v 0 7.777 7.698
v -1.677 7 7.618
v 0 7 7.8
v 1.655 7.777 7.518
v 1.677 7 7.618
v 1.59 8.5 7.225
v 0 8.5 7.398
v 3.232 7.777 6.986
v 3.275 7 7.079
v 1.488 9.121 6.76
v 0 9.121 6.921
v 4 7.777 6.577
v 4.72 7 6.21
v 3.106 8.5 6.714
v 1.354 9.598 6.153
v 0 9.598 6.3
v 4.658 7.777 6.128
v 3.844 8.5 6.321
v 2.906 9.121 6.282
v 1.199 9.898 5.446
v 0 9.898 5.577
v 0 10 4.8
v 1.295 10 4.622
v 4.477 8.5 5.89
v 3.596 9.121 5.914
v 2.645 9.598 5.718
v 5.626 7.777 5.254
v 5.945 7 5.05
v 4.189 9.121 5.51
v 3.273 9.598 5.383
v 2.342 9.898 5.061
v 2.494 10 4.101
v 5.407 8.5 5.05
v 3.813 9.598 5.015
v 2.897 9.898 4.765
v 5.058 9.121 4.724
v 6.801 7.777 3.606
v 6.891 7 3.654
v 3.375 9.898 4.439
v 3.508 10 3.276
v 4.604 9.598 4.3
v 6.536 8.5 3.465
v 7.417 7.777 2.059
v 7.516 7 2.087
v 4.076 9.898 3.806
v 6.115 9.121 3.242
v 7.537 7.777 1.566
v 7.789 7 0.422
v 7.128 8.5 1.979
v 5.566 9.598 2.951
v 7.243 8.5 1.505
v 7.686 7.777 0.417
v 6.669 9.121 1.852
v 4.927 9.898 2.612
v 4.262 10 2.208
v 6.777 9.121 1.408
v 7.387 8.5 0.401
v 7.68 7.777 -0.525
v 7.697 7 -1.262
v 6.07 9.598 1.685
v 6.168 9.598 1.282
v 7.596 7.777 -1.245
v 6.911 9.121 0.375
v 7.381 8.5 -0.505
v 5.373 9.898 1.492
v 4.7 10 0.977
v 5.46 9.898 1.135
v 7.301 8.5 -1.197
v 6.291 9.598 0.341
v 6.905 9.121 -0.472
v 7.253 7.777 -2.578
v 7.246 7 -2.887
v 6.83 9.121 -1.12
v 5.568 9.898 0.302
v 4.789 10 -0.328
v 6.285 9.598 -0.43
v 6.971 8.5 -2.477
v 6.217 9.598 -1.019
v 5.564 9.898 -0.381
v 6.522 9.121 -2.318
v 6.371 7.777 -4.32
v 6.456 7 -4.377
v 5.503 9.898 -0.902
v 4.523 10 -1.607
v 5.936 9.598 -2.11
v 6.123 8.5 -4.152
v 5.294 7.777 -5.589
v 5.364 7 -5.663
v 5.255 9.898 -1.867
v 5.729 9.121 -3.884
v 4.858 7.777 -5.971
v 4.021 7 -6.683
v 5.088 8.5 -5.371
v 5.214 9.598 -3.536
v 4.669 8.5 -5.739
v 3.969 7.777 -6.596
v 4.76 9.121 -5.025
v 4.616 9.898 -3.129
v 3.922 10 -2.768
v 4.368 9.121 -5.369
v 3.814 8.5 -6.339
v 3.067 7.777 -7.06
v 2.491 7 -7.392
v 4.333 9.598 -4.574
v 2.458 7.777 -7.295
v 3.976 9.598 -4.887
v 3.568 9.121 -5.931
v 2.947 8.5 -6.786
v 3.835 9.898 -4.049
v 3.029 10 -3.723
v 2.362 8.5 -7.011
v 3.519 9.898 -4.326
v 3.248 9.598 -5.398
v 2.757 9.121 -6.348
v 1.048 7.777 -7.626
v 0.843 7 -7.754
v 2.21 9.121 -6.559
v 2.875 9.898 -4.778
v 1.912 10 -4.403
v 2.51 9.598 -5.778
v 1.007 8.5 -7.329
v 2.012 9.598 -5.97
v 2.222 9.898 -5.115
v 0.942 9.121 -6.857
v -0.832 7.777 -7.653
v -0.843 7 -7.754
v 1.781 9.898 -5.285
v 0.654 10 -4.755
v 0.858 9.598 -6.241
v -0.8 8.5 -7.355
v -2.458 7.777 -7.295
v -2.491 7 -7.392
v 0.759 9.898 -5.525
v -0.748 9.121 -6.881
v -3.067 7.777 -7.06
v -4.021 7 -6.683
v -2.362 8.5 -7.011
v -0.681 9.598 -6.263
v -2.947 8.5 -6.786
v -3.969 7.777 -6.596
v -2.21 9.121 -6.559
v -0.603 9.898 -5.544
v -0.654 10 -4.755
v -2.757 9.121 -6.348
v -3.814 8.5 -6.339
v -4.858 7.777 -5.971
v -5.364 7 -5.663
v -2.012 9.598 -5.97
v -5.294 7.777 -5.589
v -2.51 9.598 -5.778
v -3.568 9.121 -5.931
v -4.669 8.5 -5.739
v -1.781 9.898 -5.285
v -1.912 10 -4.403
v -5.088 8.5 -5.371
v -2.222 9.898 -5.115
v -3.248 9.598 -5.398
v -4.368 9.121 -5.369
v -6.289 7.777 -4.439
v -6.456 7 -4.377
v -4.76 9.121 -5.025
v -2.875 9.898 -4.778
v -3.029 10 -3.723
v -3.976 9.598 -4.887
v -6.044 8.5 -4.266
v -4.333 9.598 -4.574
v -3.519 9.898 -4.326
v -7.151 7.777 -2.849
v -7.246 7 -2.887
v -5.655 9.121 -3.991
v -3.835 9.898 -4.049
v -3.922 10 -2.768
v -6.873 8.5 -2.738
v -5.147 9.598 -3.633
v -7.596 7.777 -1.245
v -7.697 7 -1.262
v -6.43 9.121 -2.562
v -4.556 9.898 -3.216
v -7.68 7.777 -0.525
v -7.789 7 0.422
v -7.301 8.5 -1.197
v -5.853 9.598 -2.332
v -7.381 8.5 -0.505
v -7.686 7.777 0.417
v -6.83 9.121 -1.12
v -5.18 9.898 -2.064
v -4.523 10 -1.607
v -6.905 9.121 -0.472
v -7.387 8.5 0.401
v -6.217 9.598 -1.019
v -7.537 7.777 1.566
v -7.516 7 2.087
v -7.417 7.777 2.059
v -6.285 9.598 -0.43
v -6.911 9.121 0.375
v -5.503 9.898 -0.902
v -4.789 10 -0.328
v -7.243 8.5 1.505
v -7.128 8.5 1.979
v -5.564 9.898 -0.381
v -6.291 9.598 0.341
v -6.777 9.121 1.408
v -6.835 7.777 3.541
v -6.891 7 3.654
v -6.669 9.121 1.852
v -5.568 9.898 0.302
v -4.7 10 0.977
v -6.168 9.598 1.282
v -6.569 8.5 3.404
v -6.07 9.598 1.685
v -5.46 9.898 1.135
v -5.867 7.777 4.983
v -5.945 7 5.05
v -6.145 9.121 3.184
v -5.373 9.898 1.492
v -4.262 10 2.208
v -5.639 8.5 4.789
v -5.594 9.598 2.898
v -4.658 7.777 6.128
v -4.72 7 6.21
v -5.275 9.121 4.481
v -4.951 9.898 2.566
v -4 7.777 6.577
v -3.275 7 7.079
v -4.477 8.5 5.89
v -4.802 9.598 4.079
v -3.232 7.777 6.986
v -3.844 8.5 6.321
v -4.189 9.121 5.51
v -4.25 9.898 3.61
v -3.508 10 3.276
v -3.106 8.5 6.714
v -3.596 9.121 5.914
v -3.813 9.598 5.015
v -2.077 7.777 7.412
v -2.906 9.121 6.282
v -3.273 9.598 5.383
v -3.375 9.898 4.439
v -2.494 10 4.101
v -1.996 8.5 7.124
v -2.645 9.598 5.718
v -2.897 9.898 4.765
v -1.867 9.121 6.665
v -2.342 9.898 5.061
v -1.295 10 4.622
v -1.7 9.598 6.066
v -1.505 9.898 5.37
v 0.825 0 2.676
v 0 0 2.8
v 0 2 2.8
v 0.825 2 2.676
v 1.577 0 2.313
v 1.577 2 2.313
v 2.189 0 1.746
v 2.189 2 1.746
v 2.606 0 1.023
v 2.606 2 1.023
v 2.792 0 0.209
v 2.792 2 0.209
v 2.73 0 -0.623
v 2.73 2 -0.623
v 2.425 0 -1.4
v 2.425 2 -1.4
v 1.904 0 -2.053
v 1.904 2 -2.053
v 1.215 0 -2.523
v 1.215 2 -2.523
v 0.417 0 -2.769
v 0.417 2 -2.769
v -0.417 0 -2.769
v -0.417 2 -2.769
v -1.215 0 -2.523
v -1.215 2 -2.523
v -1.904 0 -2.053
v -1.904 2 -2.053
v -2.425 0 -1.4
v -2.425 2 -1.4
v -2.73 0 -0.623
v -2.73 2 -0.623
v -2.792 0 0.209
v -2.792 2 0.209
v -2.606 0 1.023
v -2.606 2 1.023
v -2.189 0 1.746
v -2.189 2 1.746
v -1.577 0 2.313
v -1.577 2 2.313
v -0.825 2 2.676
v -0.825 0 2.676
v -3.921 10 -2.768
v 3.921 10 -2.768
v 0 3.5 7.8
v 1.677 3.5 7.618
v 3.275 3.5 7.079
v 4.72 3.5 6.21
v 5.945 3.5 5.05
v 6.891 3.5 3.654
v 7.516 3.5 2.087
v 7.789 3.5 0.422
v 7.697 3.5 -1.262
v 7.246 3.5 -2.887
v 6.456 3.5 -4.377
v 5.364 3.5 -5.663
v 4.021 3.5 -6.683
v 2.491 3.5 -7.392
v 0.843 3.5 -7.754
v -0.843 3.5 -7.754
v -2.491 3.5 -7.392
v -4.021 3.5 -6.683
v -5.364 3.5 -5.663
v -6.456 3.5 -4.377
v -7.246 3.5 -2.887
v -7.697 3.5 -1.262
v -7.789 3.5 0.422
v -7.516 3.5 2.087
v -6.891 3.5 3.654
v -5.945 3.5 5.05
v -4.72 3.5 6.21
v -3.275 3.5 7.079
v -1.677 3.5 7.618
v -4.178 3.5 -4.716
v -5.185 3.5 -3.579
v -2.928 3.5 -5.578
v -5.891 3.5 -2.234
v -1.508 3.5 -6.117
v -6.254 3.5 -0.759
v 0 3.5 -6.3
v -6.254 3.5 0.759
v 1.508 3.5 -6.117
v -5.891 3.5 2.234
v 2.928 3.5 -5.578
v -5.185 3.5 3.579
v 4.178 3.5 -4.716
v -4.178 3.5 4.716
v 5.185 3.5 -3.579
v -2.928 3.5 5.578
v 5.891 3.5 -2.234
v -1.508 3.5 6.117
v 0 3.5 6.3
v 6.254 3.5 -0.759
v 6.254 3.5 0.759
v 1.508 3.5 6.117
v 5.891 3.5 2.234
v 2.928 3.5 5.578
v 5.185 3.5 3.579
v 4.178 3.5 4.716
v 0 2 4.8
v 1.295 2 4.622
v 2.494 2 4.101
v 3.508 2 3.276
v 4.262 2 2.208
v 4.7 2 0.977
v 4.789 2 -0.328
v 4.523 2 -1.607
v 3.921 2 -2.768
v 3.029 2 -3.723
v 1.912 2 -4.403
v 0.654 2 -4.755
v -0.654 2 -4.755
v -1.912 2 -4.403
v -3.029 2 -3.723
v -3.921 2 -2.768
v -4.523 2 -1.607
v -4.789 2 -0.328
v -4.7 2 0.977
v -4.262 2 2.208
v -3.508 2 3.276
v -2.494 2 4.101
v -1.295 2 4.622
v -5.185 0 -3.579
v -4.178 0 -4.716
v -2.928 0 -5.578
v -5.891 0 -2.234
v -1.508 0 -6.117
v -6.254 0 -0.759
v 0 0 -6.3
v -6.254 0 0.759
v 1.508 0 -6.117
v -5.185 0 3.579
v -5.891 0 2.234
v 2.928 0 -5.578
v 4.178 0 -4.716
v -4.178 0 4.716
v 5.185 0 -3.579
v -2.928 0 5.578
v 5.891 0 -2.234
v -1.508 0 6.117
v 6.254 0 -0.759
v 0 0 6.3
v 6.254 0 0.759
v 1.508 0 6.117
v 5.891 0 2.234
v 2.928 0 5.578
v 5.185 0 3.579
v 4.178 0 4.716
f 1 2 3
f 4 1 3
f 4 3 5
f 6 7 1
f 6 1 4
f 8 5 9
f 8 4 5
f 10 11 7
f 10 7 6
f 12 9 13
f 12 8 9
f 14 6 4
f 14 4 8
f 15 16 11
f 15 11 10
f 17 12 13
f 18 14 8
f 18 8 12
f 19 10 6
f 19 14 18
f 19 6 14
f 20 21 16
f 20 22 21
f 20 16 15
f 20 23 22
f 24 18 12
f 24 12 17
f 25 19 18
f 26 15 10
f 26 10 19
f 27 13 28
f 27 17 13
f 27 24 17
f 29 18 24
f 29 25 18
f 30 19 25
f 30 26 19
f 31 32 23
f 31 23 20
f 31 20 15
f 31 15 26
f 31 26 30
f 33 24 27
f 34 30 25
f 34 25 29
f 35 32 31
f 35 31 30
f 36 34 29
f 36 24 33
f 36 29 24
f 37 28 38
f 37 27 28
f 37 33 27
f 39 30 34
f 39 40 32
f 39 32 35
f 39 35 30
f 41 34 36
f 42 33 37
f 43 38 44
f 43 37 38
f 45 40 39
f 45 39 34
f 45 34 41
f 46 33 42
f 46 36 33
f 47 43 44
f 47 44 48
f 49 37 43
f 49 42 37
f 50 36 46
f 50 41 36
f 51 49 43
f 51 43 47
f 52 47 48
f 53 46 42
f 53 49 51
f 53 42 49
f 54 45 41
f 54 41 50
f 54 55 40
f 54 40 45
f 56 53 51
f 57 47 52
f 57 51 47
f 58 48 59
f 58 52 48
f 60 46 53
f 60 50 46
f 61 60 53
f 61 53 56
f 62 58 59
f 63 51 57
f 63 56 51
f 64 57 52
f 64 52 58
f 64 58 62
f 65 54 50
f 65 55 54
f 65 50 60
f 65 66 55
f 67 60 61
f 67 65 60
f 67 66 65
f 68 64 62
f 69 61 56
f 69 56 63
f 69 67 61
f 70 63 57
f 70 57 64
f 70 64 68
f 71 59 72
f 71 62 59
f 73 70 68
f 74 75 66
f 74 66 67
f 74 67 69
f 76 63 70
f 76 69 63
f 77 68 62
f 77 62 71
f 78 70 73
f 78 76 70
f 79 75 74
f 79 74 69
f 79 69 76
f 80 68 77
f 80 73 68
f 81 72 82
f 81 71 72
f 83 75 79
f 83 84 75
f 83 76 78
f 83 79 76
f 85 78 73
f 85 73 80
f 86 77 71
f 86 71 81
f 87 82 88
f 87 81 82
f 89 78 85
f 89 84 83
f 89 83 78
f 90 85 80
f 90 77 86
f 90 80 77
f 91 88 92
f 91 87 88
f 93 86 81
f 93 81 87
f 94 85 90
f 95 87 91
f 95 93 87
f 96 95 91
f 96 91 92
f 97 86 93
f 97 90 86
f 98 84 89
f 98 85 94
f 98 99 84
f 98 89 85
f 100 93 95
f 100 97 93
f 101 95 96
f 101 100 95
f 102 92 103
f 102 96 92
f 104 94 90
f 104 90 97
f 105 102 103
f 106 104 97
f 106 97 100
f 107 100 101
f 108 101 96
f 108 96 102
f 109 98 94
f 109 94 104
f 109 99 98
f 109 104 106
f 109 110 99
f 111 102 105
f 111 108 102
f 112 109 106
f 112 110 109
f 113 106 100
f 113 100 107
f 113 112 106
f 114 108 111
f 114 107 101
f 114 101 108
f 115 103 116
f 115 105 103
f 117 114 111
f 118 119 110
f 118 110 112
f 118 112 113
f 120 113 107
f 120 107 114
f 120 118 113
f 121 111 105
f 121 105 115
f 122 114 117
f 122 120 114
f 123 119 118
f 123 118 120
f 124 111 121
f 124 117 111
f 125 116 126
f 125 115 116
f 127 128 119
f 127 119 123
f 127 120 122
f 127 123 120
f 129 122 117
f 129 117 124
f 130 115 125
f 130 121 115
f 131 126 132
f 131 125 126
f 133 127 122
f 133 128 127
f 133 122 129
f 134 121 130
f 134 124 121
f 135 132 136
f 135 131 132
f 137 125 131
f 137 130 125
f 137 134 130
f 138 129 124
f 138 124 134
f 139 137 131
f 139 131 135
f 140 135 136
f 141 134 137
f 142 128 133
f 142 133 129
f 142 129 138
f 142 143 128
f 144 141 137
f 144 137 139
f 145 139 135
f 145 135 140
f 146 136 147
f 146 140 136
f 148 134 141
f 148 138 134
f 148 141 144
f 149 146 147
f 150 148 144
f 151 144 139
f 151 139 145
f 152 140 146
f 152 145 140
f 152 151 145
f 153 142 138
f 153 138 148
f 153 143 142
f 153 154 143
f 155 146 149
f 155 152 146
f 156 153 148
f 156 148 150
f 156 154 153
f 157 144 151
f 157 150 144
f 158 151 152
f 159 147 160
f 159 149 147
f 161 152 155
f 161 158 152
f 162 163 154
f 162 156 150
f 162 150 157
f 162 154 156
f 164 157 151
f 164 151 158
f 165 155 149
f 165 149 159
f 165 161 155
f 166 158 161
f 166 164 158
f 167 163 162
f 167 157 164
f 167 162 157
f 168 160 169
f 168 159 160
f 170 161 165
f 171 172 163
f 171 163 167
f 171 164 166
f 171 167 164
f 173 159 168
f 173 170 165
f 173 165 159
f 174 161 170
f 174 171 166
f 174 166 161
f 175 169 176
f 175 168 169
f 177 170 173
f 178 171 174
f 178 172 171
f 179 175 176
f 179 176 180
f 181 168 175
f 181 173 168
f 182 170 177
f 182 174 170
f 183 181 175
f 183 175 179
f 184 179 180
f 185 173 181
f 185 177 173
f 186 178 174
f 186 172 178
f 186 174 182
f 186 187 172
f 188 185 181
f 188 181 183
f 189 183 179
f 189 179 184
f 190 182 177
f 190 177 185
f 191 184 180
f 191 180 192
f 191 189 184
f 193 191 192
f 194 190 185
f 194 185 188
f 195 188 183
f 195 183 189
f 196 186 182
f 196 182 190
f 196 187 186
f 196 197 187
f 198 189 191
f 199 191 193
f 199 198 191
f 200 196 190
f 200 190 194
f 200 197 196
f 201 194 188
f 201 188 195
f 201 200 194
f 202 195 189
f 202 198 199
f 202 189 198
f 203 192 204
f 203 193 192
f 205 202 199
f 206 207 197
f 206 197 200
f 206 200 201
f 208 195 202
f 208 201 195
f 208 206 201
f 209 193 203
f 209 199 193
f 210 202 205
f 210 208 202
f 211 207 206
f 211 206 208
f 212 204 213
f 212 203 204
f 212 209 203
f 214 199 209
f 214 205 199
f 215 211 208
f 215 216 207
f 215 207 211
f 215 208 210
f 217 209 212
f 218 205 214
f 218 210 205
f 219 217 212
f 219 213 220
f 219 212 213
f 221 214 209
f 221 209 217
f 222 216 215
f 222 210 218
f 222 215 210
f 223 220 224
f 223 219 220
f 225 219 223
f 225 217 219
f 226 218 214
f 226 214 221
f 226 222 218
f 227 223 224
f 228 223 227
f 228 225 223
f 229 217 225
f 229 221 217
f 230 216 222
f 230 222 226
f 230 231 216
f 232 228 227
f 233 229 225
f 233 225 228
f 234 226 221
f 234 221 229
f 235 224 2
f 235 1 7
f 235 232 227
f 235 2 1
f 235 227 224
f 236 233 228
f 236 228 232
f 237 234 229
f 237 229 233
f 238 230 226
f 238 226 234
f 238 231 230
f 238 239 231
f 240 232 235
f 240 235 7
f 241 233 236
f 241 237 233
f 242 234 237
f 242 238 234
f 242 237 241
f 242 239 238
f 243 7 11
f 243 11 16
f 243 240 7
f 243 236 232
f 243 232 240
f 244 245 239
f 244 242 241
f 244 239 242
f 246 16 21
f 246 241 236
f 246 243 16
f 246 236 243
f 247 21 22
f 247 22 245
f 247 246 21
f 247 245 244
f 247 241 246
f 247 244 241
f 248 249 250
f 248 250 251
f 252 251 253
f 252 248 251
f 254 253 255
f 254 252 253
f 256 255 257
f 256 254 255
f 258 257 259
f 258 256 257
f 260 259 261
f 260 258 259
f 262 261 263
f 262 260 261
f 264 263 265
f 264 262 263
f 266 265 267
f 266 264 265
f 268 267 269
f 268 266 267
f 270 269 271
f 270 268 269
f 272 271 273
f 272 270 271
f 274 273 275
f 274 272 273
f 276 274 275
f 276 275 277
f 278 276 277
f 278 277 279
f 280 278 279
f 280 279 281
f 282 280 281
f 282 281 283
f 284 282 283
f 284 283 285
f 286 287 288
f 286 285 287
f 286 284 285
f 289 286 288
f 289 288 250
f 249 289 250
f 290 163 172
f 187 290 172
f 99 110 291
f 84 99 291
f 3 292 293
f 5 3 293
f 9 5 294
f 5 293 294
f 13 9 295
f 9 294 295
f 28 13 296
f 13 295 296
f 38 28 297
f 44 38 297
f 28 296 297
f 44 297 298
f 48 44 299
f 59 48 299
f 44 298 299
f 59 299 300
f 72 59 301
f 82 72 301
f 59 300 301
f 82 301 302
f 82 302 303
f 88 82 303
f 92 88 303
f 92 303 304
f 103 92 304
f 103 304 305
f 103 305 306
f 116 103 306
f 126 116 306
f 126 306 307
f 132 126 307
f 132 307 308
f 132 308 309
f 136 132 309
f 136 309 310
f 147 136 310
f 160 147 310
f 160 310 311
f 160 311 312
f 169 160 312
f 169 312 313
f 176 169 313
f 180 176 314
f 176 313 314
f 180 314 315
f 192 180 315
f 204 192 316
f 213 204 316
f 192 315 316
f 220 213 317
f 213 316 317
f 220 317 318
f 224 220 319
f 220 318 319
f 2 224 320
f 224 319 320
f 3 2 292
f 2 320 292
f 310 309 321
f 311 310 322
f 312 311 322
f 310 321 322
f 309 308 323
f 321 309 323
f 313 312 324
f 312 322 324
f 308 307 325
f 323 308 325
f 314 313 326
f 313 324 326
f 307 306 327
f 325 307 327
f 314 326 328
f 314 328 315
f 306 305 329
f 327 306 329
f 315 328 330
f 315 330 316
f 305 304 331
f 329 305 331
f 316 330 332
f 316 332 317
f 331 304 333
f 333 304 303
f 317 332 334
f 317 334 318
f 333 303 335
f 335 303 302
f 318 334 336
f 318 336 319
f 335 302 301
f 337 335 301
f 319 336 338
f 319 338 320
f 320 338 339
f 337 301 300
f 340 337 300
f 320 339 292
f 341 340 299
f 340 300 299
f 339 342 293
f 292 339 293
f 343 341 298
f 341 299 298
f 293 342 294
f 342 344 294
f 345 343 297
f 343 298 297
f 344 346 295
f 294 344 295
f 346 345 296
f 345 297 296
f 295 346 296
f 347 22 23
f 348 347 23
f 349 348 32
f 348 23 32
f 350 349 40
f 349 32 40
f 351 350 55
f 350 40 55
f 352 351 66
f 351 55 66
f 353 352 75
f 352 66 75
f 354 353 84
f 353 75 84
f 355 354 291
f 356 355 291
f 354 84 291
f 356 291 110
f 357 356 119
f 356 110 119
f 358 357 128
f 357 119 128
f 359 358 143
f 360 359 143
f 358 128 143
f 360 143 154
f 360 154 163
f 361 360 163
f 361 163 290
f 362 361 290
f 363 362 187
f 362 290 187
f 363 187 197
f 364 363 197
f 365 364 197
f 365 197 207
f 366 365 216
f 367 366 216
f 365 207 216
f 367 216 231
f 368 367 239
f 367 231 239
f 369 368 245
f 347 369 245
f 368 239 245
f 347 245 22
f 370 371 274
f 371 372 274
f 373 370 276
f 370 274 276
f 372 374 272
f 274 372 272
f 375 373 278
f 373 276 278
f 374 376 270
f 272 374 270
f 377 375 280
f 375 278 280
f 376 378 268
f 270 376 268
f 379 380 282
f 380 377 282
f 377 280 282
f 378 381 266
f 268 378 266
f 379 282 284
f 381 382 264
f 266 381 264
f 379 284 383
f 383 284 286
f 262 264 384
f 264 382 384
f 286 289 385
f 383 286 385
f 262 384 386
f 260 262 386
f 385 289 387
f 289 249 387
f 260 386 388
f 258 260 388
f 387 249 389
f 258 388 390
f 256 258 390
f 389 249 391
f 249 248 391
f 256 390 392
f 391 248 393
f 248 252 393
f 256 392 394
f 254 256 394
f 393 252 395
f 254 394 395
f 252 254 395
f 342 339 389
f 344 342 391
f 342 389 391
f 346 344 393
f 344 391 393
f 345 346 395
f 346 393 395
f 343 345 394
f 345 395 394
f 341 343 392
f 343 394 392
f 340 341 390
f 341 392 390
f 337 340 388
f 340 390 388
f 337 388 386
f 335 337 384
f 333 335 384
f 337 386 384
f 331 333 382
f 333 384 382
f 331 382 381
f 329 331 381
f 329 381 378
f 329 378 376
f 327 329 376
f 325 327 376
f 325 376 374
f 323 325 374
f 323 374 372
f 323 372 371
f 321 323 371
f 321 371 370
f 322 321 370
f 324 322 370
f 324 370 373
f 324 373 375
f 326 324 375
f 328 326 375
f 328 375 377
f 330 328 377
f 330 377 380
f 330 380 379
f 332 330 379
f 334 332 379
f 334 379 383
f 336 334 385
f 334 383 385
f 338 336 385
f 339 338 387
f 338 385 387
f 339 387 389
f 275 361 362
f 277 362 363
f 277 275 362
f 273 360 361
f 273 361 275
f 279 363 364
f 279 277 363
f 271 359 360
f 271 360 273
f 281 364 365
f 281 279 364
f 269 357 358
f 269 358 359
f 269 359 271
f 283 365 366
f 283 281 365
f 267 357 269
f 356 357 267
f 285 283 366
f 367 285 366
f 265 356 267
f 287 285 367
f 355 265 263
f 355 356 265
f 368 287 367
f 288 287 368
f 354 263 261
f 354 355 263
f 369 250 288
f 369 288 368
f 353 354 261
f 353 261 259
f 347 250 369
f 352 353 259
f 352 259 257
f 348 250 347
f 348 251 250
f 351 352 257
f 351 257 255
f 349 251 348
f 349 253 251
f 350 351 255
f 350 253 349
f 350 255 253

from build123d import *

# Parameters (mm, degrees)
SKETCH1_R               = 7.8
BOSS_EXTRUDE1_DEPTH     = 10
SKETCH2_R               = 4.8
CUT_EXTRUDE1_DEPTH      = 8
CUT_EXTRUDE2_DEPTH      = 1.5
CUT_EXTRUDE2_DEPTH_BACK = 14.626444878
SKETCH3_R               = 7.8
SKETCH3_R_2             = 6.3
SKETCH3_R_3             = 2.8
FILLET1_R               = 3


with BuildPart() as part:
    # Sketch1 → Boss-Extrude1 (new body)
    with BuildSketch(Plane(origin=(0, 0, 0), x_dir=(1, 0, 0), z_dir=(0, 1, 0))):
        with Locations(Location((0, 0, 0), (0, 0, 270))):
            Circle(SKETCH1_R)
    extrude(amount=BOSS_EXTRUDE1_DEPTH)

    # Sketch2 → Cut-Extrude1 (cut)
    with BuildSketch(Plane(origin=(0, 10, 0), x_dir=(1, 0, 0), z_dir=(0, 1, 0))):
        with Locations(Location((0, 0, 0), (0, 0, 270))):
            Circle(SKETCH2_R)
    extrude(amount=-CUT_EXTRUDE1_DEPTH, mode=Mode.SUBTRACT)

    # Sketch3 → Cut-Extrude2 (cut, two sides: drawn at the far end of the back side and taken through both)
    # profile 1 of 2: a face of its own
    with BuildSketch(Plane(origin=(0, 2, 0), x_dir=(1, 0, 0), z_dir=(0, 1, 0)).offset(-CUT_EXTRUDE2_DEPTH_BACK)):
        with Locations(Location((0, 0, 0), (0, 0, 270))):
            Circle(SKETCH3_R)
        with Locations(Location((0, 0, 0), (0, 0, 270))):
            Circle(SKETCH3_R_2, mode=Mode.SUBTRACT)
    # profile 2 of 2: a face of its own
    with BuildSketch(Plane(origin=(0, 2, 0), x_dir=(1, 0, 0), z_dir=(0, 1, 0)).offset(-CUT_EXTRUDE2_DEPTH_BACK)):
        with Locations(Location((0, 0, 0), (0, 0, 270))):
            Circle(SKETCH3_R_3)
    extrude(amount=CUT_EXTRUDE2_DEPTH + CUT_EXTRUDE2_DEPTH_BACK, mode=Mode.SUBTRACT)

    # Fillet1
    fillet1_edges = [part.edges().sort_by_distance(p)[0] for p in [
        (0, 10, -7.8),
    ]]
    fillet(fillet1_edges, radius=FILLET1_R - 0.0001)  # a hair under: the kernel refuses the full size


solid = part.part
